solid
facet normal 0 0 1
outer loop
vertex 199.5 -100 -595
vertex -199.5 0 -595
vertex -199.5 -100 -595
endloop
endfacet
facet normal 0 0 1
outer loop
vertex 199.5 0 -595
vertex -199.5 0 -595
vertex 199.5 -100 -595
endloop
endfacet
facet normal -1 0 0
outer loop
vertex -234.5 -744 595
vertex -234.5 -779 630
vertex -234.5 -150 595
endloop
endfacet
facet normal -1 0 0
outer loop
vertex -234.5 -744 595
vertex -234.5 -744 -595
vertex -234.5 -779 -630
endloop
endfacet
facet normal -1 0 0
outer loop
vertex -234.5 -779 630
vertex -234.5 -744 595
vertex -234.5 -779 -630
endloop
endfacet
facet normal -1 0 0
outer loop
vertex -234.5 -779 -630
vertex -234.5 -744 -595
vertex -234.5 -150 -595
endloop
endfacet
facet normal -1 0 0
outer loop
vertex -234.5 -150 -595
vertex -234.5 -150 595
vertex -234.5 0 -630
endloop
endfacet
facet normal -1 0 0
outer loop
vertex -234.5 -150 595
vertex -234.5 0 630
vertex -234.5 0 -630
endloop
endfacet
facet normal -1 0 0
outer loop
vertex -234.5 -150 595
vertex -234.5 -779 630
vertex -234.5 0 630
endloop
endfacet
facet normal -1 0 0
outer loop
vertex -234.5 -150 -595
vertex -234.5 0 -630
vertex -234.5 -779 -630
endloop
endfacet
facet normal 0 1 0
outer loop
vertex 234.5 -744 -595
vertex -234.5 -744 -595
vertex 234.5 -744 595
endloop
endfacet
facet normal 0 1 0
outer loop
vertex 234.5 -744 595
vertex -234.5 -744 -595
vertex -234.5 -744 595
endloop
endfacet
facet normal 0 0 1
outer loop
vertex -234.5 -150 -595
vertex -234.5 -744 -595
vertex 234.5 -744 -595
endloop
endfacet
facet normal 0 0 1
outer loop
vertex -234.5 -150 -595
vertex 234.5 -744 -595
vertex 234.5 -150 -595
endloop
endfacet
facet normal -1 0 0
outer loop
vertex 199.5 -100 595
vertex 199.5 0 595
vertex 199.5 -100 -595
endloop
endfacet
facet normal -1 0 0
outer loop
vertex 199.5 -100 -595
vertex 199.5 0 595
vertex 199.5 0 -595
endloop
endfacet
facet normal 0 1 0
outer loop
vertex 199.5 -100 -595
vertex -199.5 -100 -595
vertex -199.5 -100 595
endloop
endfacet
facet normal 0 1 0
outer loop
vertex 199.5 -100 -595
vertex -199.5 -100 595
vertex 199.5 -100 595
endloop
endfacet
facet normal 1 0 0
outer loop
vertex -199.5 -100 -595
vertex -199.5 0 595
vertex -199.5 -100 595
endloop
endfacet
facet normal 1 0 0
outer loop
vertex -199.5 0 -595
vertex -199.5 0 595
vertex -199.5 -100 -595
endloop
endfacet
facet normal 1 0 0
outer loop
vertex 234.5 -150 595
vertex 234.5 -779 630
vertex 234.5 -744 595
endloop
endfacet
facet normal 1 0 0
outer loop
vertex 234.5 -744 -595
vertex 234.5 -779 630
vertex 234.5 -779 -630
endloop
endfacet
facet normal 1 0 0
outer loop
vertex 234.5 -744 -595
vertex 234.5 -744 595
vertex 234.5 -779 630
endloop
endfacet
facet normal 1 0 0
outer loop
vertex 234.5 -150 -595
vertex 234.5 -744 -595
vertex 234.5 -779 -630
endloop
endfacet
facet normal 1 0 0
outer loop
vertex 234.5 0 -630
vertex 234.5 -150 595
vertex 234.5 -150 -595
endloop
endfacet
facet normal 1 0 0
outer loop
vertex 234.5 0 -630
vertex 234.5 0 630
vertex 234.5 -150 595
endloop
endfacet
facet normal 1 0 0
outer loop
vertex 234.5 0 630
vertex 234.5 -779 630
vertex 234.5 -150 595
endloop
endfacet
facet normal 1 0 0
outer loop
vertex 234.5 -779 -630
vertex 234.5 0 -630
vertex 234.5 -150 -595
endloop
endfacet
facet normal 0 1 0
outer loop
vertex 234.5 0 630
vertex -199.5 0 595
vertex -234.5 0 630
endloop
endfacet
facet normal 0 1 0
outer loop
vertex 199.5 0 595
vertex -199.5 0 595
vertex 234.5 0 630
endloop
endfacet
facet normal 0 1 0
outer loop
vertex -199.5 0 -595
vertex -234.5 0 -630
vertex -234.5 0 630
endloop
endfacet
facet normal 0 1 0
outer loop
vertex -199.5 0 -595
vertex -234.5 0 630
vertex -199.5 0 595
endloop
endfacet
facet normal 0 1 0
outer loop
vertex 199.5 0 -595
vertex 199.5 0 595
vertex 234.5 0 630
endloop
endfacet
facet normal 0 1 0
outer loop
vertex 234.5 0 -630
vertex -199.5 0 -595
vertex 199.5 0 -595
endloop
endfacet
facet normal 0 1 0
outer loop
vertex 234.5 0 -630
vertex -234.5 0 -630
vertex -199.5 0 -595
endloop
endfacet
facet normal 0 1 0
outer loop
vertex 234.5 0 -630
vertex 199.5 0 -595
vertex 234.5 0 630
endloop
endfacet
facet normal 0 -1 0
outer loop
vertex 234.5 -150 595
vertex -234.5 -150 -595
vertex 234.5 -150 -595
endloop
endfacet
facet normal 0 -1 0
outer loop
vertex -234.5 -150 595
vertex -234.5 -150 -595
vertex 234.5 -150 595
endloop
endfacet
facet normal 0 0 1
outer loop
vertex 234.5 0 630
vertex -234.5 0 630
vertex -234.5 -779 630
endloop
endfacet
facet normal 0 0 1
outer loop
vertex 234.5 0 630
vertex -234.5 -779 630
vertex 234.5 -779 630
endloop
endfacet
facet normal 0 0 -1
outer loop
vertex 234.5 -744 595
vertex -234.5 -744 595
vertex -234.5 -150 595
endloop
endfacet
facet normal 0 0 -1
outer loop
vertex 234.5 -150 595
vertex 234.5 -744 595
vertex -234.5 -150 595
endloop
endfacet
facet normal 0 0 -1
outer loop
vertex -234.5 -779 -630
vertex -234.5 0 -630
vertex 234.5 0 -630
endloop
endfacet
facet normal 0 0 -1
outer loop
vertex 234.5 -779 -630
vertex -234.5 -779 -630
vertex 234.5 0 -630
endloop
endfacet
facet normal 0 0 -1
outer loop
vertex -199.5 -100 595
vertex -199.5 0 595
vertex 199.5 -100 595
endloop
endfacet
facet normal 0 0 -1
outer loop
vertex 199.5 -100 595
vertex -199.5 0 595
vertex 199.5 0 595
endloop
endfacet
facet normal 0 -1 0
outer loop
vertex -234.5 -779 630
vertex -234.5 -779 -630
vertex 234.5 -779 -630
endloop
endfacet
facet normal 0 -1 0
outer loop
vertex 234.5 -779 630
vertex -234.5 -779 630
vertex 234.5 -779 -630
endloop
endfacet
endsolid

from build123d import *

# Parameters (mm, degrees)
SKETCH1_W           = 469
SKETCH1_H           = 1260
BOSS_EXTRUDE1_DEPTH = 779
SKETCH2_W           = 399
SKETCH2_H           = 1190
CUT_EXTRUDE1_DEPTH  = 100
SKETCH3_W           = 1190
SKETCH3_H           = 594
CUT_EXTRUDE3_DEPTH  = 1107.210649018


with BuildPart() as part:
    # Sketch1 → Boss-Extrude1 (new body)
    with BuildSketch(Plane(origin=(0, 0, 0), x_dir=(1, 0, 0), z_dir=(0, 1, 0))):
        Rectangle(SKETCH1_W, SKETCH1_H)
    extrude(amount=-BOSS_EXTRUDE1_DEPTH)

    # Sketch2 → Cut-Extrude1 (cut)
    with BuildSketch(Plane(origin=(0, 0, 0), x_dir=(1, 0, 0), z_dir=(0, 1, 0))):
        Rectangle(SKETCH2_W, SKETCH2_H)
    extrude(amount=-CUT_EXTRUDE1_DEPTH, mode=Mode.SUBTRACT)

    # Sketch3 → Cut-Extrude3 (cut, through all)
    with BuildSketch(Plane.ZY.offset(234.5)):
        with Locations((0, -447)):
            Rectangle(SKETCH3_W, SKETCH3_H)
    extrude(amount=-CUT_EXTRUDE3_DEPTH, mode=Mode.SUBTRACT)


solid = part.part
